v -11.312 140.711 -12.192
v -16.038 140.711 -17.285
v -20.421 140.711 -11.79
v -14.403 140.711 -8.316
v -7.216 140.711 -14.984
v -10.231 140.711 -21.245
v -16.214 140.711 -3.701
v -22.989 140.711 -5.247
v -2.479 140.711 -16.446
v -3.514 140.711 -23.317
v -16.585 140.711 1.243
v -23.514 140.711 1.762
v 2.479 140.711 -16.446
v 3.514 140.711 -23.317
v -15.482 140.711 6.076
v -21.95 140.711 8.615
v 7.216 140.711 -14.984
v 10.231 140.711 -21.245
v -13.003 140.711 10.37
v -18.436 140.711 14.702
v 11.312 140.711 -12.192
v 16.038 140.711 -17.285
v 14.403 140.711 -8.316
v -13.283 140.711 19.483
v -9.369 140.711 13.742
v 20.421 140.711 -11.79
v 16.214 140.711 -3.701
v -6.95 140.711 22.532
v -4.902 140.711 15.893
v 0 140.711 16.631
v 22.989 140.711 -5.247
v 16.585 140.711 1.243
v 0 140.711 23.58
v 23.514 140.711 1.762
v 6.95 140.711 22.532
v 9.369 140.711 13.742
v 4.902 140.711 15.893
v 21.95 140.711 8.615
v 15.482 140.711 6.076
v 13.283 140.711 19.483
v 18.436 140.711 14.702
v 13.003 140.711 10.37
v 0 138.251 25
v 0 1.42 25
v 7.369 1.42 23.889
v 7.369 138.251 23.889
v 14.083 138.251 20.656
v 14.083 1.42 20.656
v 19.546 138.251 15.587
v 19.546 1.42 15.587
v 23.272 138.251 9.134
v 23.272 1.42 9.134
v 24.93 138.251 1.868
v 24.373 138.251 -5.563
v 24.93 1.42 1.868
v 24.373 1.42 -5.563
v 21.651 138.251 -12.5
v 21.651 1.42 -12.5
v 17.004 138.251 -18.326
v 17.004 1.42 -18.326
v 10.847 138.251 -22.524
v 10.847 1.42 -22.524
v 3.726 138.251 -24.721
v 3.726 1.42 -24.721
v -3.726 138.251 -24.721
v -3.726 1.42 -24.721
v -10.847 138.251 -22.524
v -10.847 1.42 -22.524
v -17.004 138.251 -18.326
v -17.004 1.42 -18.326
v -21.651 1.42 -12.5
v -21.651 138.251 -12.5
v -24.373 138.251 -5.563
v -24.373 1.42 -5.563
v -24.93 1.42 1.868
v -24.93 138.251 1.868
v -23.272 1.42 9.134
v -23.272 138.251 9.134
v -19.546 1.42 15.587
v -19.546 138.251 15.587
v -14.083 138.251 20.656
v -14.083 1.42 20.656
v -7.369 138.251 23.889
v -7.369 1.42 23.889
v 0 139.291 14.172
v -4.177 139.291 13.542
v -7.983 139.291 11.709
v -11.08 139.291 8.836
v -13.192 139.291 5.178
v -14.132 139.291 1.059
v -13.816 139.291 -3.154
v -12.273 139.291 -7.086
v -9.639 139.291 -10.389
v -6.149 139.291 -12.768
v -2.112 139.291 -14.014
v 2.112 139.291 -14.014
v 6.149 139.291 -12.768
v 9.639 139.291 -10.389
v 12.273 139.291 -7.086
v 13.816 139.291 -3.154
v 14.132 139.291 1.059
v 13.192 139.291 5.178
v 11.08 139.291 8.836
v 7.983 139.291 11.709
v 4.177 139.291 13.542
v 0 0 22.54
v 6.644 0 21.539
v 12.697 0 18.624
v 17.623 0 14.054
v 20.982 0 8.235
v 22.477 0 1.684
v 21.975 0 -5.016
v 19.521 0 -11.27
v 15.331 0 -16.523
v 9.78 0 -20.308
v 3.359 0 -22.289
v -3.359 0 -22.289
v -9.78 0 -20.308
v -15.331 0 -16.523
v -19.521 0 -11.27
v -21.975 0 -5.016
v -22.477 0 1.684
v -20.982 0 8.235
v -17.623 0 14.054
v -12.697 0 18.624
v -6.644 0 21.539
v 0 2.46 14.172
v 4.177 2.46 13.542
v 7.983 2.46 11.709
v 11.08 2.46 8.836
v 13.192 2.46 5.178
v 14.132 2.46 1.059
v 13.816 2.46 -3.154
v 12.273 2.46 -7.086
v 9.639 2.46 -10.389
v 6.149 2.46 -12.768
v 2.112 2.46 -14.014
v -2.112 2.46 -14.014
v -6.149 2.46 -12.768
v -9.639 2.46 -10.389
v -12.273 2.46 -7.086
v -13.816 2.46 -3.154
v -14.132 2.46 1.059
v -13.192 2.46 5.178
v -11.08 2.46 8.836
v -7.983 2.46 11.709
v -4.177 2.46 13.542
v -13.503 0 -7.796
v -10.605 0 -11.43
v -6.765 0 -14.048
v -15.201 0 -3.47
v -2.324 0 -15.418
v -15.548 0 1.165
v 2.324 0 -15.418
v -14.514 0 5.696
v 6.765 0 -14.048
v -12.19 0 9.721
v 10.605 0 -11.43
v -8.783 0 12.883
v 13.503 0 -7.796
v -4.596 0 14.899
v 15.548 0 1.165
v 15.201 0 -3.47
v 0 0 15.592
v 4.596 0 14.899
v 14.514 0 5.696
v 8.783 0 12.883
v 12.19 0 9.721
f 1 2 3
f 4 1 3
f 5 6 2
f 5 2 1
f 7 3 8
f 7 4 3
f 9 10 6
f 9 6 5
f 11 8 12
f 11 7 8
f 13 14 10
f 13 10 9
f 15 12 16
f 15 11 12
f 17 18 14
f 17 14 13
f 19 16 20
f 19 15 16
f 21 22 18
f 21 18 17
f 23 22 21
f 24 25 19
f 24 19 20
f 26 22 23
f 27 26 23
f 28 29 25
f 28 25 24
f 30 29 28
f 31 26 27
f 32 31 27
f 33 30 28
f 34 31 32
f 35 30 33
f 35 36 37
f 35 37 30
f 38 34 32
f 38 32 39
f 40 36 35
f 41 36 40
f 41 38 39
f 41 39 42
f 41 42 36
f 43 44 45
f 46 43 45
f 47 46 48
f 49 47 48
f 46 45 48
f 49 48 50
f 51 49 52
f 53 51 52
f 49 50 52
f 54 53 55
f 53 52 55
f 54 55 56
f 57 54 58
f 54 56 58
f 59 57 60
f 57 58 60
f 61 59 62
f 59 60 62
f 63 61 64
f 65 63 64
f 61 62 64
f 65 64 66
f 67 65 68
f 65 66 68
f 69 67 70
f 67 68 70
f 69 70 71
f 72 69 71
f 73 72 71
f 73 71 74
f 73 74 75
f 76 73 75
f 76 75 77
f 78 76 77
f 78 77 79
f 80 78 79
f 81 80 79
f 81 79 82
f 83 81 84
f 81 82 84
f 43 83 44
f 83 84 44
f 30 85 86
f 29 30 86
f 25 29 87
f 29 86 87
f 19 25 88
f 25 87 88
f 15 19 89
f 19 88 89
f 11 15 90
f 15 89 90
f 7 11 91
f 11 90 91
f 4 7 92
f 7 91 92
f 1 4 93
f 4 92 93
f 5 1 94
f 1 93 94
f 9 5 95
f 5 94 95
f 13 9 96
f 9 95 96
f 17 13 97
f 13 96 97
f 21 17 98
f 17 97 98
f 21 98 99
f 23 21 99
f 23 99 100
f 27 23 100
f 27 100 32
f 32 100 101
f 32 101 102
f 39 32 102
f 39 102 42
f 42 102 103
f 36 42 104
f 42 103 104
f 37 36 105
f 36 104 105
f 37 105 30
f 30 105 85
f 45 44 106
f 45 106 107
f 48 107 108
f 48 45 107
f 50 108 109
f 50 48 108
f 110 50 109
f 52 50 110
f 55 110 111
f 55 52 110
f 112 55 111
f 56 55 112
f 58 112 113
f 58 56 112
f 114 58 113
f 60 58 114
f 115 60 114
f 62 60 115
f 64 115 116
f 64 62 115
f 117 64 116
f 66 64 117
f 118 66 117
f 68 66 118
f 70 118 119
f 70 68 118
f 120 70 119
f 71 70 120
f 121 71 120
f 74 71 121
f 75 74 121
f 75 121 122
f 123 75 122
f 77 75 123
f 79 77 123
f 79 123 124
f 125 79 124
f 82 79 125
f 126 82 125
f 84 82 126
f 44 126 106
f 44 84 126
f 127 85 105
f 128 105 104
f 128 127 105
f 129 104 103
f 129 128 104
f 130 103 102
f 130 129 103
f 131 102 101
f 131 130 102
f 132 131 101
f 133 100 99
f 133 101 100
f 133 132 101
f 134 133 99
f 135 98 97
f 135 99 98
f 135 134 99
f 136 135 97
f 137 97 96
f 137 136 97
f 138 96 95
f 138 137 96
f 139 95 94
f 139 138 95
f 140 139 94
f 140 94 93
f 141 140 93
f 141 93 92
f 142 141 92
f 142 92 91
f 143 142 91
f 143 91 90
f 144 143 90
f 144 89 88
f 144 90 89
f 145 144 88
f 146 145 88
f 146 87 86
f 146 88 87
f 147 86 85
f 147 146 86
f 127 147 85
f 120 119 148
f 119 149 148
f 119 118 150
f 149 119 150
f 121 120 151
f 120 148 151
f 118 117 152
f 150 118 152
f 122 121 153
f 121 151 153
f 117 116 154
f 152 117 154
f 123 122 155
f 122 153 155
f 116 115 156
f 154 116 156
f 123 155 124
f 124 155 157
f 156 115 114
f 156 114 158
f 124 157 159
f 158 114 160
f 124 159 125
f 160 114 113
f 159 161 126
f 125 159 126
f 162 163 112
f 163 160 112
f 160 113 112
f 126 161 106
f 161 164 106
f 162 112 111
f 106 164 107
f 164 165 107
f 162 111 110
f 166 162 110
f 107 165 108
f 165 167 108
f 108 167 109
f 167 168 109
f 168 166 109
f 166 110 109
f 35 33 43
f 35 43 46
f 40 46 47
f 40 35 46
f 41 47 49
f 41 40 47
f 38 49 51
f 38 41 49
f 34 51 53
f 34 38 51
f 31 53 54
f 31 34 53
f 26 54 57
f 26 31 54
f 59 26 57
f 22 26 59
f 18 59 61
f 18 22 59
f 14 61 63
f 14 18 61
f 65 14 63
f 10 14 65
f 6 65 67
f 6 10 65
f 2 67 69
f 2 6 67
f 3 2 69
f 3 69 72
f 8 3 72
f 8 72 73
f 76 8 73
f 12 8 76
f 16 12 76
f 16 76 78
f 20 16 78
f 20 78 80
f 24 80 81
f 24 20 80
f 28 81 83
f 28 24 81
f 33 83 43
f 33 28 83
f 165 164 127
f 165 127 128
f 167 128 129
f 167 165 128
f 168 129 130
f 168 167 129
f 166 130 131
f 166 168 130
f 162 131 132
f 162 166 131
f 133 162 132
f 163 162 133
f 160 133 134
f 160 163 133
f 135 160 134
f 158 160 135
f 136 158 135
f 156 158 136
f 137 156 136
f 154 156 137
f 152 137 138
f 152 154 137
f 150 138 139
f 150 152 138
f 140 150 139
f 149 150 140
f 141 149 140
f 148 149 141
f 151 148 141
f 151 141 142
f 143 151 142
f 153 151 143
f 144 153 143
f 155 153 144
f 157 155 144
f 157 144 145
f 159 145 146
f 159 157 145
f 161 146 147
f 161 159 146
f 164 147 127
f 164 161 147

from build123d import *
from OCP.BRepFilletAPI import BRepFilletAPI_MakeChamfer

# Parameters (mm, degrees)
SKETCH1_R           = 25
BOSS_EXTRUDE1_DEPTH = 140.711096177
SKETCH2_R           = 14.171797432
CUT_EXTRUDE1_DEPTH  = 146.084846167
CHAMFER1_SIZE       = 2.459659491
CHAMFER1_SIZE2      = 1.420085069


with BuildPart() as part:
    # Sketch1 → Boss-Extrude1 (new body)
    with BuildSketch(Plane(origin=(0, 0, 0), x_dir=(1, 0, 0), z_dir=(0, 1, 0))):
        Circle(SKETCH1_R)
    extrude(amount=BOSS_EXTRUDE1_DEPTH)

    # Sketch2 → Cut-Extrude1 (cut, through all)
    with BuildSketch(Plane(origin=(0, 0, 0), x_dir=(1, 0, 0), z_dir=(0, 1, 0))):
        Circle(SKETCH2_R)
    extrude(amount=CUT_EXTRUDE1_DEPTH, mode=Mode.SUBTRACT)

    # Chamfer1: one chamfer whose edges measure the first distance from different faces: ONE call of the kernel's chamfer builder (chamfer() names one face for all edges)
    chamfer1_edges_1 = [part.edges().sort_by_distance(p)[0] for p in [
        (-14.171797432, 140.711096177, 0),
    ]]
    chamfer1_side_1 = [part.faces().sort_by_distance(p)[0] for p in [
        (-24.292893219, 140.711096177, 0),
    ]]
    chamfer1_edges_2 = [part.edges().sort_by_distance(p)[0] for p in [
        (-14.171797432, 0, 0),
    ]]
    chamfer1_side_2 = [part.faces().sort_by_distance(p)[0] for p in [
        (-14.171797432, 70.355548089, 0),
    ]]
    chamfer1_edges_3 = [part.edges().sort_by_distance(p)[0] for p in [
        (-25, 0, 0),
    ]]
    chamfer1_side_3 = [part.faces().sort_by_distance(p)[0] for p in [
        (-24.292893219, 0, 0),
    ]]
    chamfer1_edges_4 = [part.edges().sort_by_distance(p)[0] for p in [
        (-25, 140.711096177, 0),
    ]]
    chamfer1_side_4 = [part.faces().sort_by_distance(p)[0] for p in [
        (-25, 70.355548089, 0),
    ]]
    chamfer1 = BRepFilletAPI_MakeChamfer(part.part.solid().wrapped)
    for e in chamfer1_edges_1:
        chamfer1.Add(CHAMFER1_SIZE, CHAMFER1_SIZE2, e.wrapped, chamfer1_side_1[0].wrapped)  # the first distance lies on this face
    for e in chamfer1_edges_2:
        chamfer1.Add(CHAMFER1_SIZE, CHAMFER1_SIZE2, e.wrapped, chamfer1_side_2[0].wrapped)  # the first distance lies on this face
    for e in chamfer1_edges_3:
        chamfer1.Add(CHAMFER1_SIZE, CHAMFER1_SIZE2, e.wrapped, chamfer1_side_3[0].wrapped)  # the first distance lies on this face
    for e in chamfer1_edges_4:
        chamfer1.Add(CHAMFER1_SIZE, CHAMFER1_SIZE2, e.wrapped, chamfer1_side_4[0].wrapped)  # the first distance lies on this face
    add(Compound.cast(chamfer1.Shape()), mode=Mode.REPLACE)


solid = part.part
